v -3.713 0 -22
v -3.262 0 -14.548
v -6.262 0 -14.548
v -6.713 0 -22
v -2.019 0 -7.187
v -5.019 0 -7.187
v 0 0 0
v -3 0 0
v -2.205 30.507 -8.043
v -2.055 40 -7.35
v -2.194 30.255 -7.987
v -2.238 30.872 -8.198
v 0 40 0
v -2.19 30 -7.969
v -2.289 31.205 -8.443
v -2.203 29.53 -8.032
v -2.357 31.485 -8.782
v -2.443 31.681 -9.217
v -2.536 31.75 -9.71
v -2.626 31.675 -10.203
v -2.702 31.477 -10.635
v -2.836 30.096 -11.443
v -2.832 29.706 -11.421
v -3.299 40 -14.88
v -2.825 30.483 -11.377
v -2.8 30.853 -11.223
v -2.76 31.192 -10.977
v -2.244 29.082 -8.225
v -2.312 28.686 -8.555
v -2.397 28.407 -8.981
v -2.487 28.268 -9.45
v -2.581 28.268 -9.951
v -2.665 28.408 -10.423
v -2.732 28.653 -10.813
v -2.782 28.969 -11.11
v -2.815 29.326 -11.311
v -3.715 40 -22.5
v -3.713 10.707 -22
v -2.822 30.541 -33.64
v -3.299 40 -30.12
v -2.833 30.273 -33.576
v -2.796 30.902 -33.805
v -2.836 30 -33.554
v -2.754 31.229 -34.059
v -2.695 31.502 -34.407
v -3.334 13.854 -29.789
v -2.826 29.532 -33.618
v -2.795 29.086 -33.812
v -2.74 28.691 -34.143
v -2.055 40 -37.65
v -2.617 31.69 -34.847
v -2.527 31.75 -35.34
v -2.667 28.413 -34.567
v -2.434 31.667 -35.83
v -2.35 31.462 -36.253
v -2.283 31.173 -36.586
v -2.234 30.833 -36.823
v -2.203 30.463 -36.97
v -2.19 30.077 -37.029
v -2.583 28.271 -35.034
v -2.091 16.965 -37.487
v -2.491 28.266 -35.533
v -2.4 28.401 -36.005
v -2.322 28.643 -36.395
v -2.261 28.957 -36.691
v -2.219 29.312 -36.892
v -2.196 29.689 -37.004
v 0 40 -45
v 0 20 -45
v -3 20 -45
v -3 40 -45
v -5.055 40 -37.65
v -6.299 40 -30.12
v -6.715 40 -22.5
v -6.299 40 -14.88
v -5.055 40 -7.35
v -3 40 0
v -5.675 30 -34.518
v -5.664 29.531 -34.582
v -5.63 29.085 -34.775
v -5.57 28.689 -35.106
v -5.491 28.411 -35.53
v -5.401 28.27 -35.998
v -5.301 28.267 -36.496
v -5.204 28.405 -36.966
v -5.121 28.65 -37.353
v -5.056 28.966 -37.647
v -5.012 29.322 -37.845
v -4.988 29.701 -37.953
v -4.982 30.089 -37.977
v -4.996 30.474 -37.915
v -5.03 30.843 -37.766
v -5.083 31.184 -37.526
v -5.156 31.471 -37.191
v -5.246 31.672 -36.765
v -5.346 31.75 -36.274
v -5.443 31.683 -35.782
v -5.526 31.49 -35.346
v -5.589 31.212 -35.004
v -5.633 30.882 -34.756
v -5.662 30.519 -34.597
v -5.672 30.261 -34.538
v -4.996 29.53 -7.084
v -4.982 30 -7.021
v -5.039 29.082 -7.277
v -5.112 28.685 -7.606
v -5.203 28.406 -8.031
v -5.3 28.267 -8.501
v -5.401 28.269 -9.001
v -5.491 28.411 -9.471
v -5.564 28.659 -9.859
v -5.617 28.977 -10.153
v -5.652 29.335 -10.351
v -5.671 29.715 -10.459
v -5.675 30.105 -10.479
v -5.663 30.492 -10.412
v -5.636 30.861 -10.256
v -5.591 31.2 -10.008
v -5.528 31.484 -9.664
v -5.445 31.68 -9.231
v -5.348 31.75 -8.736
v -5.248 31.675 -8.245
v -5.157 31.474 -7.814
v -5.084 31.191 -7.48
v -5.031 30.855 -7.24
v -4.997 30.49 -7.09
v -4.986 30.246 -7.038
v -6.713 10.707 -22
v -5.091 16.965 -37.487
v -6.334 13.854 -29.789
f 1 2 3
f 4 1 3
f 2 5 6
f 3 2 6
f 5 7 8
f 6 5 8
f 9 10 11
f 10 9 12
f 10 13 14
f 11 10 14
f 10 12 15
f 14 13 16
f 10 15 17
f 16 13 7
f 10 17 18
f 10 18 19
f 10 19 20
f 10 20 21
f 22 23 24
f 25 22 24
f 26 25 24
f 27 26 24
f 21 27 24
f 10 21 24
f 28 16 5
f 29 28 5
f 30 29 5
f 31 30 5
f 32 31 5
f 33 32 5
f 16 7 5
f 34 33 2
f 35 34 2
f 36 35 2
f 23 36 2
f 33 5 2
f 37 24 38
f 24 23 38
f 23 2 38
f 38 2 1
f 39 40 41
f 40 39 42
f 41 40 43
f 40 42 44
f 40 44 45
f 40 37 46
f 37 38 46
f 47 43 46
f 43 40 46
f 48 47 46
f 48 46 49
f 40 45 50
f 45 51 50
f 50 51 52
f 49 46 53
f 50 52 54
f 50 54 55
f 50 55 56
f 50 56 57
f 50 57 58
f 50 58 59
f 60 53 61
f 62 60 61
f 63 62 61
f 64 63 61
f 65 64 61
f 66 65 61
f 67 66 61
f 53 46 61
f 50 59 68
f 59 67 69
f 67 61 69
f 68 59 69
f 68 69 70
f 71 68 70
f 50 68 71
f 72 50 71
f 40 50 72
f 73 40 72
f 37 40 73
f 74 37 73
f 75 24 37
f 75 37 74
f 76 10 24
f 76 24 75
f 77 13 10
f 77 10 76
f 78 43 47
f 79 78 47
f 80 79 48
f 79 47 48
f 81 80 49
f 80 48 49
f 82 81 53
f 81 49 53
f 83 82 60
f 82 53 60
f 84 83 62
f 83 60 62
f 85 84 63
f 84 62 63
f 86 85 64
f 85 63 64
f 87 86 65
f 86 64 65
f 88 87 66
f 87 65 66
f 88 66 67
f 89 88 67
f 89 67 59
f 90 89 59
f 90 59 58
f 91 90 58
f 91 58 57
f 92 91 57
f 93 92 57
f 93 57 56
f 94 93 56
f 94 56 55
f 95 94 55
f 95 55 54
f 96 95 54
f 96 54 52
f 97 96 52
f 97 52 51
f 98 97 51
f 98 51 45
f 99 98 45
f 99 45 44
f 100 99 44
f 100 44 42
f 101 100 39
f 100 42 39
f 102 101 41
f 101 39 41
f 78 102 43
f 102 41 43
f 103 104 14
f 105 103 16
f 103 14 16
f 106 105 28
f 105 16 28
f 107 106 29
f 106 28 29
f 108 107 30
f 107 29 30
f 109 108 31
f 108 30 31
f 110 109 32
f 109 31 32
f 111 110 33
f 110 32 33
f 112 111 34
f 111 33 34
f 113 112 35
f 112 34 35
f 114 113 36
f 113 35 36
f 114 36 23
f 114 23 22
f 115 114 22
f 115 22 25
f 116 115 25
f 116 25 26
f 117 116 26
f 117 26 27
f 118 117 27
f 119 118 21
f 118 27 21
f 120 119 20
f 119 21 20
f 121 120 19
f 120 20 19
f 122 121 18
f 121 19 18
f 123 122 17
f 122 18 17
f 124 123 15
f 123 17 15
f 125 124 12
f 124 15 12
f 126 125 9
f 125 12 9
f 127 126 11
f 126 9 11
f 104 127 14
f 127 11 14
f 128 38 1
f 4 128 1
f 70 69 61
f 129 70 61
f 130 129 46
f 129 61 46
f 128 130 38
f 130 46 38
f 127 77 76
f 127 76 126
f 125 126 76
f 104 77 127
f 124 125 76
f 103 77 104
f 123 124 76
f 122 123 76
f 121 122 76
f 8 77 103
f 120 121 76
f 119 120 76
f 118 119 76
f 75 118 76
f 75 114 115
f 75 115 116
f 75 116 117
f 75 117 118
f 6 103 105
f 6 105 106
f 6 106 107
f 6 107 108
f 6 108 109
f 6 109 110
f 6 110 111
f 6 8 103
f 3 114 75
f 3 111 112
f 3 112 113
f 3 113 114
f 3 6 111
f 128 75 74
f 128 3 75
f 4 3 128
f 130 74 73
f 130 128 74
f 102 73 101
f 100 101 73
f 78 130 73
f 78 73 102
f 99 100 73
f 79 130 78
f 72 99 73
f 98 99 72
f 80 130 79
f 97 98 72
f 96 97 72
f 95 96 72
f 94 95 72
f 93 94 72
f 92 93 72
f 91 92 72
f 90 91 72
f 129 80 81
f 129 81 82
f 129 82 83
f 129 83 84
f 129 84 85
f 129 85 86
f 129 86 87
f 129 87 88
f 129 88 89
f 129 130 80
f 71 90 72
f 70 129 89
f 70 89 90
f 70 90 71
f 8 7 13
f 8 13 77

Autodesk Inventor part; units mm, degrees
ref_plane "YZ Plane" through (0, 0, 0) normal (1, 0, 0) x (0, 1, 0)
sketch "Sketch1" plane through (0, 0, 0) normal (0, 1, 0) x (-1, 0, 0)
  line L0 (0, 0) -> (0, -45) construction
  arc A0 (0, -45) -> (0, 0) centre (-66.2854, -22.5) ccw
  line L1 (0, 0) -> (3, 0)
  line L2 (0, -45) -> (3, -45)
  arc A1 (3, -45) -> (3, 0) centre (-63.2854, -22.5) ccw
  dimension "d0" = 45
  dimension "d1" = 70
  dimension "d2" = 3
  dimension "d3" = 3
  dimension "d4" = 70
extrude "Extrusion1" add sketch "Sketch1" along normal blind 40
ref_plane "Work Plane1" through (-3, 0, -45) normal (-0.9469, 0, -0.3214) x (0, -1, 0)
sketch "Sketch2" plane through (-3, 0, -45) normal (-0.9469, 0, -0.3214) x (0, -1, 0)
  line L0 (-40, 42.612) -> (-40, 0) projected
  line L1 (0, -0.9643) -> (-40, -0.9643) projected
  point P0 (0, 41.6477)
  point P1 (-30, 9.0357)
  dimension "d7" = 10
  dimension "d8" = 10
hole "Hole1" at (-5.9043, 30, -36.4438) direction (0.9469, 0, 0.3214) diameter 3.5 end through all
ref_plane "Work Plane2" through (-3, 0, 0) normal (-0.9469, 0, 0.3214) x (0, -1, 0)
sketch "Sketch3" plane through (-3, 0, 0) normal (-0.9469, 0, 0.3214) x (0, -1, 0)
  line L0 (0, 0.9643) -> (-40, 0.9643) projected
  line L1 (-40, 0) -> (-40, -42.612) projected
  point P0 (-30, -9.0357)
  dimension "d16" = 10
  dimension "d17" = 10
hole "Hole2" at (-5.9043, 30, -8.5562) direction (0.9469, 0, -0.3214) diameter 3.5 end through all
sketch "Sketch4" plane through (0, 0, 0) normal (1, 0, 0) x (0, 1, 0)
  line L0 (0, -45) -> (40, -45) projected
  line L1 (0, 0) -> (40, 0) projected
  line L2 (0, -45) -> (0, 0) projected
  line L3 (0, 0) -> (40, 0) projected
  line L4 (40, -45) -> (40, 0) projected
  line L5 (0, -45) -> (40, -45) projected
  line L6 (0, 0) -> (0, -22)
  line L7 (20, -45) -> (10.7074, -22)
  line L8 (10.7074, -22) -> (0, -22)
  line L9 (20, -45) -> (0, -45)
  line L10 (0, -22) -> (0, -45)
  point P0 (30, -7.0213)
  point P1 (30, -34.518)
  point P2 (20, 0)
  dimension "d25" = 22
  dimension "d26" = 112
extrude "Extrusion2" cut sketch "Sketch4" against normal up to next contours L2 L8 L7 L0
properties part number "cap_mount"
